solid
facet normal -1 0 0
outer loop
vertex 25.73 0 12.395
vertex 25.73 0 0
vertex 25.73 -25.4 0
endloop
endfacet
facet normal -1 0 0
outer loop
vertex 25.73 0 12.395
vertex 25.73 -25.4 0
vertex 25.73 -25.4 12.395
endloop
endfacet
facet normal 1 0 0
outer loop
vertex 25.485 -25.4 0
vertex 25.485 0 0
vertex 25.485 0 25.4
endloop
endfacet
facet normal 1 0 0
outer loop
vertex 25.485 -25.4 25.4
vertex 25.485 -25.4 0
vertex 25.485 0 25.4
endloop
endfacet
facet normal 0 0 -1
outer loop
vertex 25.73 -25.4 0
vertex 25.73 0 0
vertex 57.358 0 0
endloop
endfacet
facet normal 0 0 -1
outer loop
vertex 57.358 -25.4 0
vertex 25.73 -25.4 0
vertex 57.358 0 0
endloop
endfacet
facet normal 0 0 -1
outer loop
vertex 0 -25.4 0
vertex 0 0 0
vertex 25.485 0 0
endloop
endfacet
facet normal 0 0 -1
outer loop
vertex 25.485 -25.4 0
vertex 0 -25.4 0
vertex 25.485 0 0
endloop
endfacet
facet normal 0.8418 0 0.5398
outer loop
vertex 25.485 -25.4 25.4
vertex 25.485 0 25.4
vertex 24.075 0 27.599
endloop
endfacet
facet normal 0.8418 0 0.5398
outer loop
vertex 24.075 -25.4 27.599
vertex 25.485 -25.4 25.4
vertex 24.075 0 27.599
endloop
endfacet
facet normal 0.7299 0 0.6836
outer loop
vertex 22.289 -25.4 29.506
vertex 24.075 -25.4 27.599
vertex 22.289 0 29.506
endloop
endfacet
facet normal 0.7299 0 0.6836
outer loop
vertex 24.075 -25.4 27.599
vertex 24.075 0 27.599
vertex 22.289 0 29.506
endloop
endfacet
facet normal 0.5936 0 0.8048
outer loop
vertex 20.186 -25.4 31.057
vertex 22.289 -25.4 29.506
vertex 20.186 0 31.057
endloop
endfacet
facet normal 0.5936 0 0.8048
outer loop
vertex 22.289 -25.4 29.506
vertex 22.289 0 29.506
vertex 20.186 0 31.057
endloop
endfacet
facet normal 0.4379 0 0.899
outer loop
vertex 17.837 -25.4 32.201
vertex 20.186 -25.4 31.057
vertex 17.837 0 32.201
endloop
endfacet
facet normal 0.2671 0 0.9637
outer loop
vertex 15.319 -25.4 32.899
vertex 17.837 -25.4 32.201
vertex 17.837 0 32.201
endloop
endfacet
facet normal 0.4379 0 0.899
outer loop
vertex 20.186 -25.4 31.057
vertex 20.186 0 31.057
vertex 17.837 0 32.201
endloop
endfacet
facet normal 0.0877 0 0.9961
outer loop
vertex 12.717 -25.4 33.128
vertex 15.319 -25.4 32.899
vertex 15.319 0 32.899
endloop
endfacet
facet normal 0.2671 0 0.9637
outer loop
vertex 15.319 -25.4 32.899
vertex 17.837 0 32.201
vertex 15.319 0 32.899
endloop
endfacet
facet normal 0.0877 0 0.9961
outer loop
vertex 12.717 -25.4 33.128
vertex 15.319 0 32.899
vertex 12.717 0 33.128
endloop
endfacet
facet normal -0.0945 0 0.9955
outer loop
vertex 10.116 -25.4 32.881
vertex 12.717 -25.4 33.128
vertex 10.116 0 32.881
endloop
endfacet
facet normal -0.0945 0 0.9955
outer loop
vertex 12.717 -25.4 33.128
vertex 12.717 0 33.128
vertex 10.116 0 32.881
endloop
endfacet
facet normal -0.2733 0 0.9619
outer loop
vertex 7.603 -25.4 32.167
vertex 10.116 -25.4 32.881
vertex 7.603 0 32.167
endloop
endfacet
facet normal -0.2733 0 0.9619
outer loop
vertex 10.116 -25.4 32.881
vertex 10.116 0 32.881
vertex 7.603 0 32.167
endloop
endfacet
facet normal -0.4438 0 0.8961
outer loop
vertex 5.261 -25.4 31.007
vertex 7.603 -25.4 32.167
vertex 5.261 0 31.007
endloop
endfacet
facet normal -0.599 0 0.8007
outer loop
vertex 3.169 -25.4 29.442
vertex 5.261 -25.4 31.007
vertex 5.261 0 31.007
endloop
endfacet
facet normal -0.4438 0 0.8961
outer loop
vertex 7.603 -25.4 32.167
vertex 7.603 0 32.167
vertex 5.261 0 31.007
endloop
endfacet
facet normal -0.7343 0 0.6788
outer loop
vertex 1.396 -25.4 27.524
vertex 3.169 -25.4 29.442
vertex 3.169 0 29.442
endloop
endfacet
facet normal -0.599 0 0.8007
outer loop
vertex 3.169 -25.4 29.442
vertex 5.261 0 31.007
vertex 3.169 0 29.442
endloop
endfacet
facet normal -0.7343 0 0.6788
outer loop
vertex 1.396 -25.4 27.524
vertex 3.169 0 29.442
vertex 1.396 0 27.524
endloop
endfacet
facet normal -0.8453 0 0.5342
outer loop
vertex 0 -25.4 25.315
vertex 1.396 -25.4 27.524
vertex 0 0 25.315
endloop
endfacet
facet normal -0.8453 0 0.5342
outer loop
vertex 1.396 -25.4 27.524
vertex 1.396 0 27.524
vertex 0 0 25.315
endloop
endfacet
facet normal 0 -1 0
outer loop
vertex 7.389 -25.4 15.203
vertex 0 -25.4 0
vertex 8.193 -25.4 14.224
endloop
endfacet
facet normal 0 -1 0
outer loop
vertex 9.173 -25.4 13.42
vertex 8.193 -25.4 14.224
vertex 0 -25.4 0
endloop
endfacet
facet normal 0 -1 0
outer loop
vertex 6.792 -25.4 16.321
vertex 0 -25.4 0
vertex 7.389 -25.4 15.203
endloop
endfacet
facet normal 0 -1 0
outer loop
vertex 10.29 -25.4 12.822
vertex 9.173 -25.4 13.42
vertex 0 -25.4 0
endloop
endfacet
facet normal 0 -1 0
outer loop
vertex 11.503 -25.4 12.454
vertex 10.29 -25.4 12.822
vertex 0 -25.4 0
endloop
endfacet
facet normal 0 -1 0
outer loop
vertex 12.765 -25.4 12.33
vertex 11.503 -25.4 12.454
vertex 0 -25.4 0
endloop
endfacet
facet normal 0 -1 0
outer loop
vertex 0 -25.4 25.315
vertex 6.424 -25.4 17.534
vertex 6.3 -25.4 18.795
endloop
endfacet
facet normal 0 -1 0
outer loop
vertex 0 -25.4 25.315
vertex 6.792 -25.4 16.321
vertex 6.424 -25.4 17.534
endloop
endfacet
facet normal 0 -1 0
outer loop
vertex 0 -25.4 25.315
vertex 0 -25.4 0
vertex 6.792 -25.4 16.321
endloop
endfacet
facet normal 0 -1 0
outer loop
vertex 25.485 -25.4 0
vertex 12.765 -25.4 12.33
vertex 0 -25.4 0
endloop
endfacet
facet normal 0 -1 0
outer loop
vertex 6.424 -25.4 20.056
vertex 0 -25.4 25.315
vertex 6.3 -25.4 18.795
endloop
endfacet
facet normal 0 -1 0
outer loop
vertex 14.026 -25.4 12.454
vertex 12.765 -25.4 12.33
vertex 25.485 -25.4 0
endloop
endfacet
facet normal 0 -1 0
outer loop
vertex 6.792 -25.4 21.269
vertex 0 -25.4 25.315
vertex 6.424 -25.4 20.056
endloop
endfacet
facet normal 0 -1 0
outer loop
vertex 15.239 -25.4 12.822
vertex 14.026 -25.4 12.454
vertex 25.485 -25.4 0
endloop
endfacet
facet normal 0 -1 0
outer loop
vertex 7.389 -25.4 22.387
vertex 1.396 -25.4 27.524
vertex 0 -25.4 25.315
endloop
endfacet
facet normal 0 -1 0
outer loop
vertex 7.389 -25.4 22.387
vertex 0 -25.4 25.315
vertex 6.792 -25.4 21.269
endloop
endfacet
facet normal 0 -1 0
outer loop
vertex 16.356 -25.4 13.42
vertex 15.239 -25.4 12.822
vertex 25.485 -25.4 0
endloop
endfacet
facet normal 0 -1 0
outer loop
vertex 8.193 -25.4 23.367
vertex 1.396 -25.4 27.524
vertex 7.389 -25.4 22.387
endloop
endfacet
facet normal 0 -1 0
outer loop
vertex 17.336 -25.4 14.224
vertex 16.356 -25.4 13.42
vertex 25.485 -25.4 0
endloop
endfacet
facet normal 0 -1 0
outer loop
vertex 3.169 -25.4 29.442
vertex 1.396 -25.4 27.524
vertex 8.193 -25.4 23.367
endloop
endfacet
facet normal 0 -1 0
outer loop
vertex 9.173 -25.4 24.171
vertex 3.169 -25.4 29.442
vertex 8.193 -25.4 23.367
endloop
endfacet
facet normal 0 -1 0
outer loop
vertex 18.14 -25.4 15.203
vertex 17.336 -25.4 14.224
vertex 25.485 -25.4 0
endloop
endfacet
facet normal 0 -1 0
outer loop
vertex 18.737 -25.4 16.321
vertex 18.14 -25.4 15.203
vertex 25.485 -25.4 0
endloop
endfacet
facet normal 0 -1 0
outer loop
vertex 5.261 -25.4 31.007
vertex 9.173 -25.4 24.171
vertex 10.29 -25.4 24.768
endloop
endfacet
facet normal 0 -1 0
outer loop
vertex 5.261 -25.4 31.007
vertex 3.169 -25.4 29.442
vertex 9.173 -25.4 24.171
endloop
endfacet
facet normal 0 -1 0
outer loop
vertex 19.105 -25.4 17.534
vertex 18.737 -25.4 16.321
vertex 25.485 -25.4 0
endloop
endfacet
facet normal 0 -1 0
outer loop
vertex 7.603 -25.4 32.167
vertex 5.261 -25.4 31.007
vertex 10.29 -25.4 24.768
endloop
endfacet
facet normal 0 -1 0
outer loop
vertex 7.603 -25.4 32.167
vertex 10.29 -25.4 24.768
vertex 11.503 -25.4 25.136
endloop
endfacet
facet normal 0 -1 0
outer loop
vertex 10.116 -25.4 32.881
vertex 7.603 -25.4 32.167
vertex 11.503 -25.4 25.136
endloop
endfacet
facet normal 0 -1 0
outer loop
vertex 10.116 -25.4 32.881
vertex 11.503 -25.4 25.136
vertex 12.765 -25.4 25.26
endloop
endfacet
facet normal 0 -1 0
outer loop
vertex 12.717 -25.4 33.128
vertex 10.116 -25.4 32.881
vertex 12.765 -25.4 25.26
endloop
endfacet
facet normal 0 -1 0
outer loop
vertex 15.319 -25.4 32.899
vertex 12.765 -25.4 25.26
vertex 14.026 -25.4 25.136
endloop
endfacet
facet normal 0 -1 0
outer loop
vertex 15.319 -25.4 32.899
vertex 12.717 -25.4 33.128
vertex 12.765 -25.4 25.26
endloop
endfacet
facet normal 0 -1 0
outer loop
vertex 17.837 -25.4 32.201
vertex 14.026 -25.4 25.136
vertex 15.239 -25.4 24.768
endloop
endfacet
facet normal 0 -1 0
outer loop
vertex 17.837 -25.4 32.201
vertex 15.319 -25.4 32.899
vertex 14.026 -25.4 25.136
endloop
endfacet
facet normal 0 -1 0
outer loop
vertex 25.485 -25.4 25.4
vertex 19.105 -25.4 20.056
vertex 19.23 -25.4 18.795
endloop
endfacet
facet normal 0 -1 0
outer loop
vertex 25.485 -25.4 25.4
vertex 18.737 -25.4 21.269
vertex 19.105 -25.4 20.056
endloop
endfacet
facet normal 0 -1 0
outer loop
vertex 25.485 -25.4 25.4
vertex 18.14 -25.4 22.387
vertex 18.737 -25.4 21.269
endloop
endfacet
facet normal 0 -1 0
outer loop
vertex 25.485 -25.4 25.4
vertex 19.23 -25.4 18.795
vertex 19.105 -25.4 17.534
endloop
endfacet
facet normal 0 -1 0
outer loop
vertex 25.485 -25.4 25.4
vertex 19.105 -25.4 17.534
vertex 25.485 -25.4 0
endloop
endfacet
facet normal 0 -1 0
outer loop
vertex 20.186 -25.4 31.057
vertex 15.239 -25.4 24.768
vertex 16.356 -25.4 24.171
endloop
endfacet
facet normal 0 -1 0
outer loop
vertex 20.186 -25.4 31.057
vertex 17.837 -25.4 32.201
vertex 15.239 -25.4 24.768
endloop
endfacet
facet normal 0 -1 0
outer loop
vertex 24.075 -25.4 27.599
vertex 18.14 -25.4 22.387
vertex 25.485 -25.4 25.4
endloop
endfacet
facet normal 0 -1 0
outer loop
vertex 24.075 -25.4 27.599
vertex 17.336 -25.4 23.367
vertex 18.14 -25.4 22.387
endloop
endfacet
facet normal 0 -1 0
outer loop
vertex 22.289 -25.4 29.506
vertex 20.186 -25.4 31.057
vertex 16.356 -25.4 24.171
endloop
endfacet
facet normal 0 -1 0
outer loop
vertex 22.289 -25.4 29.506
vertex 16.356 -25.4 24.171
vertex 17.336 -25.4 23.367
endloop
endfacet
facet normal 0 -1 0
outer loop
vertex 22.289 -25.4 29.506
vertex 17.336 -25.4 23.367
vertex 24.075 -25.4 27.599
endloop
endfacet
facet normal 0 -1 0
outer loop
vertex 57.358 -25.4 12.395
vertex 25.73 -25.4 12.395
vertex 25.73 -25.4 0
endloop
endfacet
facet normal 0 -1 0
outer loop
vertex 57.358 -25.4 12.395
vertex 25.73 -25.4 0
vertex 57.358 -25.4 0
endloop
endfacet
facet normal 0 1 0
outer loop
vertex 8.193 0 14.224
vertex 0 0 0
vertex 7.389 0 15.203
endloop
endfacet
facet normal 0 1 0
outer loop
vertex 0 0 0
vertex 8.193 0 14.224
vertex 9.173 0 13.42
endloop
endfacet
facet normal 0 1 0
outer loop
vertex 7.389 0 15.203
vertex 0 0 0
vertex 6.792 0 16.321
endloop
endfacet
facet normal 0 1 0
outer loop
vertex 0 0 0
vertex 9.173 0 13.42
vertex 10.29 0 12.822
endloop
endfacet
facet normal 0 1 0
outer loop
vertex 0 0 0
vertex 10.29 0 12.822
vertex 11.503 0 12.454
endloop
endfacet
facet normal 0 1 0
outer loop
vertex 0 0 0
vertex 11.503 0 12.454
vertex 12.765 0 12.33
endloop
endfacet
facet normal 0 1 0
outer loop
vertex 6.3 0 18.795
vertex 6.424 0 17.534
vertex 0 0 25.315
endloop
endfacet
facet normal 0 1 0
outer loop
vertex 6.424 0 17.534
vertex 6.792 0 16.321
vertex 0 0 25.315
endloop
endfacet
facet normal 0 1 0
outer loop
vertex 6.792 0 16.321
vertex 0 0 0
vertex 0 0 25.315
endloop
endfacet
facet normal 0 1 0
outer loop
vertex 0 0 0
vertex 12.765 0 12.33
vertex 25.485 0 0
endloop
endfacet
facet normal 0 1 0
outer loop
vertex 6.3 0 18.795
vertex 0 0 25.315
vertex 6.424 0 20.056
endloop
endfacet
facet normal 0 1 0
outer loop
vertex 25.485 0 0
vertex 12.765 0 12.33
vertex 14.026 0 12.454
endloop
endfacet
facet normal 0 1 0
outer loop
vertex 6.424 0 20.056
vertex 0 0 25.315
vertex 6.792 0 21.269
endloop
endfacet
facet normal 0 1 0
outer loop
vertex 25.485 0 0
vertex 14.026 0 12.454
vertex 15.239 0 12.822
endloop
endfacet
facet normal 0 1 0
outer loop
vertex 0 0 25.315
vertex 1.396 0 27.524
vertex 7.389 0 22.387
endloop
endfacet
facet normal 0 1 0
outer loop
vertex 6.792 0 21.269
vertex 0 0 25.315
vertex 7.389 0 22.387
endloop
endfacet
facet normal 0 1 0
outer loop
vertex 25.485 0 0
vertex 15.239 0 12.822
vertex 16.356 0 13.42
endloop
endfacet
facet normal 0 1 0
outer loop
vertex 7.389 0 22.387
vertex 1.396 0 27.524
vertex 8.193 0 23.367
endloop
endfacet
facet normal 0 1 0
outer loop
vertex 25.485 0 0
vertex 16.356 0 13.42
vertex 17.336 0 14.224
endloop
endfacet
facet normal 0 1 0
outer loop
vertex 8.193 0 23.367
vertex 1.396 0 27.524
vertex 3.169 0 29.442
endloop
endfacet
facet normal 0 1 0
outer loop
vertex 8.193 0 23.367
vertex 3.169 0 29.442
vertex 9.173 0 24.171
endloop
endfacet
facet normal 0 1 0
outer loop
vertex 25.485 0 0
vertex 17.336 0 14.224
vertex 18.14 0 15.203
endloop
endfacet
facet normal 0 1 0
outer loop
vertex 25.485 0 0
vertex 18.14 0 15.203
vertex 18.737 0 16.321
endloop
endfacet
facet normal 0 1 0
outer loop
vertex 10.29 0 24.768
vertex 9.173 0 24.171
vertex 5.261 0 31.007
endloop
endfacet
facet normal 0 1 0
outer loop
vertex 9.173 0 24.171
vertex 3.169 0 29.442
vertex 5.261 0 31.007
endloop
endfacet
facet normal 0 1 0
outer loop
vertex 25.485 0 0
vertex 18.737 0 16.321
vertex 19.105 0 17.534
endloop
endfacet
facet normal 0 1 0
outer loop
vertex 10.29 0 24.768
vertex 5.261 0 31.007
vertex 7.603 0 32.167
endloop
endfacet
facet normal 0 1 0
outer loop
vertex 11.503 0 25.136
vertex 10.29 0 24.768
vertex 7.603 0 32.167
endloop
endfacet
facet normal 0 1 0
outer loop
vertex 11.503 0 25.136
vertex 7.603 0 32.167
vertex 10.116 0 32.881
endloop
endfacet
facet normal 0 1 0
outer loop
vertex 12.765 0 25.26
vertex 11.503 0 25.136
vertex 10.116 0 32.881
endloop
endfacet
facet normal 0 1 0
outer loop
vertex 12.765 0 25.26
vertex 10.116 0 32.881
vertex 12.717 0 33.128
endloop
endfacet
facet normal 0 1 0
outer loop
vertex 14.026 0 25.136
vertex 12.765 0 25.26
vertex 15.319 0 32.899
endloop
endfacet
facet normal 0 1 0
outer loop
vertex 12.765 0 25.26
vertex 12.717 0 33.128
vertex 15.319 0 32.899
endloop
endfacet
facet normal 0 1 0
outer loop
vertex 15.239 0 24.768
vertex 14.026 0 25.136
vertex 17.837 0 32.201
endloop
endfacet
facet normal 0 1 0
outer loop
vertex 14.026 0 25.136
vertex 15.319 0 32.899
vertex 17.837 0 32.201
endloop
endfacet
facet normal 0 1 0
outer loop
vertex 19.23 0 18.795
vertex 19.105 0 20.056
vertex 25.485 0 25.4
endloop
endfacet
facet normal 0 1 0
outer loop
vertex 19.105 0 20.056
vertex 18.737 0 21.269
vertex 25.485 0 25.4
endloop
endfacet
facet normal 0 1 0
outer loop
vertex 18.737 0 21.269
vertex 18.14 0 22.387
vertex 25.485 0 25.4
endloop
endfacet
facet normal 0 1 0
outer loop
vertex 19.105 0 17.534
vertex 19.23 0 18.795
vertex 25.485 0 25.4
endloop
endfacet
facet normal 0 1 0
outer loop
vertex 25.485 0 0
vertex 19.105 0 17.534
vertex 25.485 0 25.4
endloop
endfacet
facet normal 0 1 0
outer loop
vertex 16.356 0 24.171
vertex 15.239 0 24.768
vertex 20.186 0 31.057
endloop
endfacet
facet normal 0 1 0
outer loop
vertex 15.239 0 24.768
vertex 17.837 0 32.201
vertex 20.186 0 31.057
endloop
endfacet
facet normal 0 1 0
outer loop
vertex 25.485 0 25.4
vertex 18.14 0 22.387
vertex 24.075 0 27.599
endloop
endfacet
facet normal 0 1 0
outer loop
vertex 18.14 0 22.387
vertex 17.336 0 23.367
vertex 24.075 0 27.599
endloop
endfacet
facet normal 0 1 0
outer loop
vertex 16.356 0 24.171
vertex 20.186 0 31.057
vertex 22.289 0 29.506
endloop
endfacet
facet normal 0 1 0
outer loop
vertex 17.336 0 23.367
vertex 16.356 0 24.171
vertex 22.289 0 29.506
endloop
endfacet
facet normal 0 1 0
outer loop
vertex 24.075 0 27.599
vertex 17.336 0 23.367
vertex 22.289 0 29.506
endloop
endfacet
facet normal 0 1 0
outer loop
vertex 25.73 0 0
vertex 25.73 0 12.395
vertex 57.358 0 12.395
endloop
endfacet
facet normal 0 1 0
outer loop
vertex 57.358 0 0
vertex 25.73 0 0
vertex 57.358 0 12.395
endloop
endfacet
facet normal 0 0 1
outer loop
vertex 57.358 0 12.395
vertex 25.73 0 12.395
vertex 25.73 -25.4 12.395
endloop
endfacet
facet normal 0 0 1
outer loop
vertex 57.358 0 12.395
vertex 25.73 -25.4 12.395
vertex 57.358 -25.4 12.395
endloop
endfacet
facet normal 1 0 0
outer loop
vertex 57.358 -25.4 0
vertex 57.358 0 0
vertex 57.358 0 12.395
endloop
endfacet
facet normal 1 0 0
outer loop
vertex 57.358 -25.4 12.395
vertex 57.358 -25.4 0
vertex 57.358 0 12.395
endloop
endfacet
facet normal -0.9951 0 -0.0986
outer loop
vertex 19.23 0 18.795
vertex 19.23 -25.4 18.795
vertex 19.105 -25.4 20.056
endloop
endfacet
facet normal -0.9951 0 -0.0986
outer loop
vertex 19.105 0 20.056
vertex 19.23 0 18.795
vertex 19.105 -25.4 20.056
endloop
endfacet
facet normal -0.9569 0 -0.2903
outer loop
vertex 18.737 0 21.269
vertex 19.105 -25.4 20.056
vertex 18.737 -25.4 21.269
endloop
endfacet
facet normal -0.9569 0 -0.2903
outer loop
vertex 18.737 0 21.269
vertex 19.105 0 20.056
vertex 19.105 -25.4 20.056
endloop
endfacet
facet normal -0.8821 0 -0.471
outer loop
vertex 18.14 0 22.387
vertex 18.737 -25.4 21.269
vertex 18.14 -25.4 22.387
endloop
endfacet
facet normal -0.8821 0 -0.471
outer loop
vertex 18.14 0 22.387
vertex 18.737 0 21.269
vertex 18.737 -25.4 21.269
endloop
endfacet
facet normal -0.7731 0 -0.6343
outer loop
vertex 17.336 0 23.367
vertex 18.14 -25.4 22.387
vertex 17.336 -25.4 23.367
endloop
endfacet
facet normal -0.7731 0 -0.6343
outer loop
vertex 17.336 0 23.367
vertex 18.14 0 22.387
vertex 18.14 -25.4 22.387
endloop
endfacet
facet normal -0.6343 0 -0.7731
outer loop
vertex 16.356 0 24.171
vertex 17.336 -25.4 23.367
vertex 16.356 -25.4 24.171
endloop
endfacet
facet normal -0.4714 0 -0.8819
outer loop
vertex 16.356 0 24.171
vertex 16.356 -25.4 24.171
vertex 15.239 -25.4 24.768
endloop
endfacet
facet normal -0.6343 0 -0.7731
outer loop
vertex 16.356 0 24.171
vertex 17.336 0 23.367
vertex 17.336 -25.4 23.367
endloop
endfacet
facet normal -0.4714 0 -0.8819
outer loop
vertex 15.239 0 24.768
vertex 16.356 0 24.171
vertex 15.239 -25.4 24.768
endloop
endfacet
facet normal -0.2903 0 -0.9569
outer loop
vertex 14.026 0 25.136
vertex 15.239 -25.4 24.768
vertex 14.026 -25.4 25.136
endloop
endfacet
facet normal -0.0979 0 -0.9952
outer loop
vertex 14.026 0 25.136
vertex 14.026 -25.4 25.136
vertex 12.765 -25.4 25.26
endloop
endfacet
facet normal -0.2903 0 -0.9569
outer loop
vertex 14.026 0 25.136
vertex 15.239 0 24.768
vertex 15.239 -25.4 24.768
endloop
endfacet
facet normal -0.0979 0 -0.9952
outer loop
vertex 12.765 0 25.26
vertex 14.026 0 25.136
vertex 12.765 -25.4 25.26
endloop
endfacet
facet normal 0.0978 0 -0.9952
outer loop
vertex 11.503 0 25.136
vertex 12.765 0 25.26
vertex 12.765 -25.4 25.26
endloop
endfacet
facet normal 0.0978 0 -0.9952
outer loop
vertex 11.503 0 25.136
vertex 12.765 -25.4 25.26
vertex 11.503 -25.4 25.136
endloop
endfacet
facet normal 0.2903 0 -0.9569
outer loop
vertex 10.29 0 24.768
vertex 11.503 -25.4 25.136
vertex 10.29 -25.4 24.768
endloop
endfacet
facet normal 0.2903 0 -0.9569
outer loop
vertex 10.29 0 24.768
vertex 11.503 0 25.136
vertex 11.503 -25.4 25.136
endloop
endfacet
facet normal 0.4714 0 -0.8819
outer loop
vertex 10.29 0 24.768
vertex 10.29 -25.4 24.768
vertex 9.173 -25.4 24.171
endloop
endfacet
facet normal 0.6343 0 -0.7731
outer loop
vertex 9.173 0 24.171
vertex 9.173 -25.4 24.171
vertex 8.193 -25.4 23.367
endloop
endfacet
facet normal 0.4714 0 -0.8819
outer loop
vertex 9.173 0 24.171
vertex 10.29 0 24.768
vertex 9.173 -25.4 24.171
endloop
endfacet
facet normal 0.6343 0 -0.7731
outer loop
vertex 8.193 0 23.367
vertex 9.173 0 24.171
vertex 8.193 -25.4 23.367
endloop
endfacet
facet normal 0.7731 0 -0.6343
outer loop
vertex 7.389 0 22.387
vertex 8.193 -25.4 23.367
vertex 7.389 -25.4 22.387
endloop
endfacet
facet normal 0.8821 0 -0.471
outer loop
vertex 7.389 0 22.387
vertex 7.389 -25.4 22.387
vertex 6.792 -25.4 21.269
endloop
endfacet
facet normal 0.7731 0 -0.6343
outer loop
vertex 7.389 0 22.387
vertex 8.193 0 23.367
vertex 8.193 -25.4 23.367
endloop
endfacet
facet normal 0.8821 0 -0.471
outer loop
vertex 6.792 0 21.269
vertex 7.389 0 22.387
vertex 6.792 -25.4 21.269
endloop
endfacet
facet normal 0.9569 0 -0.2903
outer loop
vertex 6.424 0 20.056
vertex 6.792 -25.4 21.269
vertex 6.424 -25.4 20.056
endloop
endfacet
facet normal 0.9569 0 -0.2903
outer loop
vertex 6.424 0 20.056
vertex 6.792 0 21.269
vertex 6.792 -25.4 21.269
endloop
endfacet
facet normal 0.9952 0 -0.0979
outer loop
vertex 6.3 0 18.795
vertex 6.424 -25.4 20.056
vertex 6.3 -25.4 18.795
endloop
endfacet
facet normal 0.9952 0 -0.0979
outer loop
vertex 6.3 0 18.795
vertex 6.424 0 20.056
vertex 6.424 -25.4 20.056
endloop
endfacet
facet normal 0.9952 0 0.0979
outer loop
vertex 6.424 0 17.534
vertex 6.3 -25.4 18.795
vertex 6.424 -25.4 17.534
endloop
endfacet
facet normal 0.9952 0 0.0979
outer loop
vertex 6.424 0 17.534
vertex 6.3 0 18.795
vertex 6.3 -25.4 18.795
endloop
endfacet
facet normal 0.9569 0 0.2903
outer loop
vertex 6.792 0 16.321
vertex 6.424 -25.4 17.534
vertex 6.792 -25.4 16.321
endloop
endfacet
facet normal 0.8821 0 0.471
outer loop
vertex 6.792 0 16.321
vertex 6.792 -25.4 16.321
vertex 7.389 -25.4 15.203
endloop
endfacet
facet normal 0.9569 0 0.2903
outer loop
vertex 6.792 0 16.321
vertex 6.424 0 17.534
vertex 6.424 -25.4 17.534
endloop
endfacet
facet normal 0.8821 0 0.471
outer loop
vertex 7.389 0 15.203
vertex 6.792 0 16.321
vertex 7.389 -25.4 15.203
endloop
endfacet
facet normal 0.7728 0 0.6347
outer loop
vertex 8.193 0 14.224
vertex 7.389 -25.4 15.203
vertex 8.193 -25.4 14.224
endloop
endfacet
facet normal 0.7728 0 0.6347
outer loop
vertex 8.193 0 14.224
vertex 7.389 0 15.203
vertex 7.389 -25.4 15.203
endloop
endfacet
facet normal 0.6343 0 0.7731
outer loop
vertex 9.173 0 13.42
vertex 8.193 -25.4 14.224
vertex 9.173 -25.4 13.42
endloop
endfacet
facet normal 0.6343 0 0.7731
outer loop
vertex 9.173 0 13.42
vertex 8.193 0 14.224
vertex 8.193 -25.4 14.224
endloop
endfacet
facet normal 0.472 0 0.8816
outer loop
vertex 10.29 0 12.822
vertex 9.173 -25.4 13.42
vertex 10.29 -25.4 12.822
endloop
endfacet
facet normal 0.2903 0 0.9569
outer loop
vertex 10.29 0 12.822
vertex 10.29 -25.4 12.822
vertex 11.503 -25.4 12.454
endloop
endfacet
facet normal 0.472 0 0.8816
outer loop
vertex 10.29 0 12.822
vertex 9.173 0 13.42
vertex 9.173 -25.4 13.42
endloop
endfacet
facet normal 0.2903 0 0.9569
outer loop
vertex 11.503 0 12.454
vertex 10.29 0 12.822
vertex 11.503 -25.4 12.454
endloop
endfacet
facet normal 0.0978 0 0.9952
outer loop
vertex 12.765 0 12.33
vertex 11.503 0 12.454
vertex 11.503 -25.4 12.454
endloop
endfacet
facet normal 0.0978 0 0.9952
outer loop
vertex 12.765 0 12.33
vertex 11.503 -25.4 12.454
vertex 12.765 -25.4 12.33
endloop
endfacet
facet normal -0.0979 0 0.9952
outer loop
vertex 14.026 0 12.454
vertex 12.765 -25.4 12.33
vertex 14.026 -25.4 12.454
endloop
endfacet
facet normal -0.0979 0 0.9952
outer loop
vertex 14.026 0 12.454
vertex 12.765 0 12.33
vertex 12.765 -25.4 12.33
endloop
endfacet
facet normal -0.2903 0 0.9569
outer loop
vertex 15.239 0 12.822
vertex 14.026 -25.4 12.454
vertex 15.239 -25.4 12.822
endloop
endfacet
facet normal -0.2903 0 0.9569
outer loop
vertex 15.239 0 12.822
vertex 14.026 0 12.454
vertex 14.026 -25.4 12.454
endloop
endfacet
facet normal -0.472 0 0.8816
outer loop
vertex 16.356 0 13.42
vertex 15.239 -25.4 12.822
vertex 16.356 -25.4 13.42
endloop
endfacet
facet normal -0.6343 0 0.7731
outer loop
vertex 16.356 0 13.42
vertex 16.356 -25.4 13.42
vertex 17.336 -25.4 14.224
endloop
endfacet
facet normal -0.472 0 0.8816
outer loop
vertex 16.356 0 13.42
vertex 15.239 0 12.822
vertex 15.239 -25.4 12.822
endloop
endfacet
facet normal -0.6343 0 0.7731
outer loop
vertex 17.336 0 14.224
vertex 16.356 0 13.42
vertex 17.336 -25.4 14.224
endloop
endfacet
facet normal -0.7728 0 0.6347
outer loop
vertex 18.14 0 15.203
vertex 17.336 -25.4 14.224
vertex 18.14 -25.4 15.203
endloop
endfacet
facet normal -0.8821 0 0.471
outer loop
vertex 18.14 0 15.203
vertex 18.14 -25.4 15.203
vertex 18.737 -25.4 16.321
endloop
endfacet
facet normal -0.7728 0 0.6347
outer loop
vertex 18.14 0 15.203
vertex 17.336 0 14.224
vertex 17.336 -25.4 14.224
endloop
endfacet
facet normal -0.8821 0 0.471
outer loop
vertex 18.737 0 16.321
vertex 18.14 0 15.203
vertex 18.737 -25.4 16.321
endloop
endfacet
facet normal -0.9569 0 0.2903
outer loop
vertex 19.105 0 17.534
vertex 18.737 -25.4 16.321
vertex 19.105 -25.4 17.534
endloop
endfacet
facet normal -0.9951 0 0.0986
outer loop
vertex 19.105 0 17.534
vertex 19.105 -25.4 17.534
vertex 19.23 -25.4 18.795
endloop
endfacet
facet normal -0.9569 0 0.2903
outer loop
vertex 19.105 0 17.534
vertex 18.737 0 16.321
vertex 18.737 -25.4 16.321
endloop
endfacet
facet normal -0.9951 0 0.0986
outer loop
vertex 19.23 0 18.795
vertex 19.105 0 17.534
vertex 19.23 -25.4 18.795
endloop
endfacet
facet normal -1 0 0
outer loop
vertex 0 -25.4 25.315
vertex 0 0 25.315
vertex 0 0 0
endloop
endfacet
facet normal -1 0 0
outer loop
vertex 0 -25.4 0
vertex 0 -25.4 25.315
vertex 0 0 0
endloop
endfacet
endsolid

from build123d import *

# Parameters (mm, degrees)
F0_R     = 6.465046
F1_DEPTH = 25.4
F2_W     = 31.62788
F2_H     = 12.394711
F3_DEPTH = 25.4


with BuildPart() as f1:
    # F0 (on Front) → F1 (new body)
    with BuildSketch(Plane.XZ):
        with BuildLine():
            Line((0, 25.314765), (0, 0))
            Line((0, 0), (25.485235, 0))
            Line((25.485235, 0), (25.485235, 12.7))
            Line((25.485235, 12.7), (25.485235, 25.4))
            ThreePointArc((25.485235, 25.4), (12.716628, 33.128228), (0, 25.314765))
        make_face()
        with Locations((12.764565, 18.795145)):
            Circle(F0_R, mode=Mode.SUBTRACT)
    extrude(amount=F1_DEPTH)


with BuildPart() as f3:
    # F2 (on Front) → F3 (new body)
    with BuildSketch(Plane.XZ):
        with Locations((41.543654, 6.197355)):
            Rectangle(F2_W, F2_H)
    extrude(amount=F3_DEPTH)


solid = Compound([f1.part, f3.part])
